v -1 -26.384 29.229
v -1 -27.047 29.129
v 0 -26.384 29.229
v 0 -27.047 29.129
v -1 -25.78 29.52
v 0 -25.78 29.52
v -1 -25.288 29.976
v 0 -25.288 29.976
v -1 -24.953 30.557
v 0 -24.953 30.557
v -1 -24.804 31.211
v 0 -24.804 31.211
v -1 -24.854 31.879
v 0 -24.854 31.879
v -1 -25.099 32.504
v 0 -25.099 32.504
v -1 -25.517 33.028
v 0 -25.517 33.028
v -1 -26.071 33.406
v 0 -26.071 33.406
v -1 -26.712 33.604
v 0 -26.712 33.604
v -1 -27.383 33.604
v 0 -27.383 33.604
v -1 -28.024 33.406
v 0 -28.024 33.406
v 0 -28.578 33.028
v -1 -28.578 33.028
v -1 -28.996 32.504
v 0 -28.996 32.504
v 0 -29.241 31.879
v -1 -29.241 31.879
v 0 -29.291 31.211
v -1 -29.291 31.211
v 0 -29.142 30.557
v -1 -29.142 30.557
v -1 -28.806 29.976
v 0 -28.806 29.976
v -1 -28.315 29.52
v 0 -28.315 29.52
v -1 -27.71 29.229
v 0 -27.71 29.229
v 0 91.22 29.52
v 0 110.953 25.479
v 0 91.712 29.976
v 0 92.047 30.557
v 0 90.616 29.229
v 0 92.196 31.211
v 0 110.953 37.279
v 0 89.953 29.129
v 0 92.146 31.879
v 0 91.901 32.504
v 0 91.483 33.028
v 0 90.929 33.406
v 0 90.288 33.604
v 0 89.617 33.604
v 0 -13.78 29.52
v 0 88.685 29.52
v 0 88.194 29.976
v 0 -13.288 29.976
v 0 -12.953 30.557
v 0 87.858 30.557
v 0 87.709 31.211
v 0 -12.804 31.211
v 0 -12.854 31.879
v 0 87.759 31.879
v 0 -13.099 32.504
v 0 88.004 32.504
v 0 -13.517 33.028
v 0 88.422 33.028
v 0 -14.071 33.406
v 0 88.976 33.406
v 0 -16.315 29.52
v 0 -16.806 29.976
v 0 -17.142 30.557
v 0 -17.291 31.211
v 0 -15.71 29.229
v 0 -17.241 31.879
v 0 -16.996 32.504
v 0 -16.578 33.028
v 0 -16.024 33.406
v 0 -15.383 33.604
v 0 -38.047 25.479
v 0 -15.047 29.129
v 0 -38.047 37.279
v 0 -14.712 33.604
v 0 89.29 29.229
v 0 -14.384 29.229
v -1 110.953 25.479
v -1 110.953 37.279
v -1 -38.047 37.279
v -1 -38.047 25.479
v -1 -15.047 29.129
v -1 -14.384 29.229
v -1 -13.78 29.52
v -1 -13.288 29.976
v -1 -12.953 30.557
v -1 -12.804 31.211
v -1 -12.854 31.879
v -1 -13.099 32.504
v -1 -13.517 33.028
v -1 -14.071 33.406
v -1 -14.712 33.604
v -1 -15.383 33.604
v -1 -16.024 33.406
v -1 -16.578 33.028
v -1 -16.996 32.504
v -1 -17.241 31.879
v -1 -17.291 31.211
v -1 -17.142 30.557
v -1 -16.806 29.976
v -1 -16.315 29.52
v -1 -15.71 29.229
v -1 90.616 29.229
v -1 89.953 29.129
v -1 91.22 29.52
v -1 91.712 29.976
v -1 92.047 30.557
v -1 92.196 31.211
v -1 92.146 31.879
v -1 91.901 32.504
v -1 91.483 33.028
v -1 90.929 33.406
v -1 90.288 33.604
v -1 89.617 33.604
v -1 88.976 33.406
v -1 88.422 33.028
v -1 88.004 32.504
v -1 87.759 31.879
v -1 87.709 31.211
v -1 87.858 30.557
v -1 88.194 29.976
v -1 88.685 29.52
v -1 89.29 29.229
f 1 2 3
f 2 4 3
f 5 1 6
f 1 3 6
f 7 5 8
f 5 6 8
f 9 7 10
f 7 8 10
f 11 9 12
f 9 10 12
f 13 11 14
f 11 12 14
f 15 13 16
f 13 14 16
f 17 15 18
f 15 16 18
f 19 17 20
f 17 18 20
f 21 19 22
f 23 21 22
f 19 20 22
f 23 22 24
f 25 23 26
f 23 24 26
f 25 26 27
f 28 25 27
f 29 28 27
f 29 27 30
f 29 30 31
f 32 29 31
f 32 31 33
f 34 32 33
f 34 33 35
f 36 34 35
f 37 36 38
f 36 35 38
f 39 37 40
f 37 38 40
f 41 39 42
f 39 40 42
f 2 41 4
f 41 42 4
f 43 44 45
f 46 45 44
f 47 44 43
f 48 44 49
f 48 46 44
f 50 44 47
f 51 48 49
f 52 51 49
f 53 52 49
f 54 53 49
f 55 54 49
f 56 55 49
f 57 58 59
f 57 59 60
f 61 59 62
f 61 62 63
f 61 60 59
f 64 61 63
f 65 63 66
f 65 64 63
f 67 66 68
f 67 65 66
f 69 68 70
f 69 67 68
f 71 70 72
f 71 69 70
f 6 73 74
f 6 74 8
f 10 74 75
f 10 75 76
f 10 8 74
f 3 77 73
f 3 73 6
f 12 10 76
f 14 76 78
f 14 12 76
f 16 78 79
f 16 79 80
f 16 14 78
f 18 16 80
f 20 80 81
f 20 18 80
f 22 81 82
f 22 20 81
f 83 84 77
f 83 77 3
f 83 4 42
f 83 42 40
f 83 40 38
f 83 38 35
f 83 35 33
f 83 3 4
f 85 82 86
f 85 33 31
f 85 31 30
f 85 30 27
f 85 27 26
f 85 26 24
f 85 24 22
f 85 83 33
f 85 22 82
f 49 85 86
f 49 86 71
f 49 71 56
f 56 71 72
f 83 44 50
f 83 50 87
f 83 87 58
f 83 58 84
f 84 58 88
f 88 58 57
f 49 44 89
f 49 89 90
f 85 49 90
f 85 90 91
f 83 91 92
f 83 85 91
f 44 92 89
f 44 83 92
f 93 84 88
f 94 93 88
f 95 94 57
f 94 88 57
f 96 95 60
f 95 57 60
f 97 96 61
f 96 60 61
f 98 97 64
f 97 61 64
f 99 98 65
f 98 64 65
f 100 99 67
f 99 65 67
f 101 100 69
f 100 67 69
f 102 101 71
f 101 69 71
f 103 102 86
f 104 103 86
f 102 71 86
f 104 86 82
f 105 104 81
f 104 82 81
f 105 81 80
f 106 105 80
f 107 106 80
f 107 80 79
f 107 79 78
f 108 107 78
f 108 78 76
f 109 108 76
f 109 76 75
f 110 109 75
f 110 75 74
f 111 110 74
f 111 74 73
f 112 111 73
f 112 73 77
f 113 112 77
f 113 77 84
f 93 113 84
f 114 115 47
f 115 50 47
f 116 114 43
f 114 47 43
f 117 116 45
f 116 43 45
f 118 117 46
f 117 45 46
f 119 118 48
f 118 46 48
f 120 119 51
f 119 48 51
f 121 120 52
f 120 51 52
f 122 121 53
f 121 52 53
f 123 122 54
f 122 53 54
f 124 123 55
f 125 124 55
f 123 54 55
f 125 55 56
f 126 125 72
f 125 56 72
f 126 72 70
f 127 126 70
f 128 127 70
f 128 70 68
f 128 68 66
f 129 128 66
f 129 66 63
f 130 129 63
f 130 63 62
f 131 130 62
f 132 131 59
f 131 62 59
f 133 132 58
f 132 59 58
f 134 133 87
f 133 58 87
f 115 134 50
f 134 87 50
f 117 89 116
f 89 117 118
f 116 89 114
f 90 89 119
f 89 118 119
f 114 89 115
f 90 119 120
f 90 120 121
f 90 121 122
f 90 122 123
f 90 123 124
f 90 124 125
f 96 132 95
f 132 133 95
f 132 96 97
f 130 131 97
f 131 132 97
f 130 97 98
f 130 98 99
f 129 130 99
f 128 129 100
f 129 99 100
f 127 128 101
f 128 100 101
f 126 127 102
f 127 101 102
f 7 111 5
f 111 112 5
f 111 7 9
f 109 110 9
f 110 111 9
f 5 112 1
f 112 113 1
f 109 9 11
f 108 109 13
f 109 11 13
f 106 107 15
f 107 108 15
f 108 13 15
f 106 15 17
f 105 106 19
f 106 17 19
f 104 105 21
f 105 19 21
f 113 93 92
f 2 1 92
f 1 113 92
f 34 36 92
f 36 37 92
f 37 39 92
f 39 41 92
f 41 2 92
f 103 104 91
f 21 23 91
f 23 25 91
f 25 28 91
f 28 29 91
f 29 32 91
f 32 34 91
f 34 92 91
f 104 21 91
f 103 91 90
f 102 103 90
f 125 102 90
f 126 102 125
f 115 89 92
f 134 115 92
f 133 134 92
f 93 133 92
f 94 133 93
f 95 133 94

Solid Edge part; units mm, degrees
sketch "Sketch1" plane through (0, 0, 0) normal (1, 0, 0) x (0, 1, 0)
  line L0 (-38.0473, 37.2787) -> (-38.0473, 25.4787)
  line L1 (-38.0473, 25.4787) -> (110.9527, 25.4787)
  line L2 (110.9527, 25.4787) -> (110.9527, 37.2787)
  line L3 (110.9527, 37.2787) -> (-38.0473, 37.2787)
  dimension "D1" = 149
  dimension "D2" = 11.8
extrude "Protrusion1" add sketch "Sketch1" against normal blind 1
hole "Hole_1" at (0, -15.0473, 31.3787) direction (-1, 0, 0) diameter 4.5 end through all
hole "Hole1" at (0, 89.9527, 31.3787) direction (-1, 0, 0) diameter 4.5 end through all
hole "Hole2" at (0, -27.0473, 31.3787) direction (-1, 0, 0) diameter 4.5 end through all
